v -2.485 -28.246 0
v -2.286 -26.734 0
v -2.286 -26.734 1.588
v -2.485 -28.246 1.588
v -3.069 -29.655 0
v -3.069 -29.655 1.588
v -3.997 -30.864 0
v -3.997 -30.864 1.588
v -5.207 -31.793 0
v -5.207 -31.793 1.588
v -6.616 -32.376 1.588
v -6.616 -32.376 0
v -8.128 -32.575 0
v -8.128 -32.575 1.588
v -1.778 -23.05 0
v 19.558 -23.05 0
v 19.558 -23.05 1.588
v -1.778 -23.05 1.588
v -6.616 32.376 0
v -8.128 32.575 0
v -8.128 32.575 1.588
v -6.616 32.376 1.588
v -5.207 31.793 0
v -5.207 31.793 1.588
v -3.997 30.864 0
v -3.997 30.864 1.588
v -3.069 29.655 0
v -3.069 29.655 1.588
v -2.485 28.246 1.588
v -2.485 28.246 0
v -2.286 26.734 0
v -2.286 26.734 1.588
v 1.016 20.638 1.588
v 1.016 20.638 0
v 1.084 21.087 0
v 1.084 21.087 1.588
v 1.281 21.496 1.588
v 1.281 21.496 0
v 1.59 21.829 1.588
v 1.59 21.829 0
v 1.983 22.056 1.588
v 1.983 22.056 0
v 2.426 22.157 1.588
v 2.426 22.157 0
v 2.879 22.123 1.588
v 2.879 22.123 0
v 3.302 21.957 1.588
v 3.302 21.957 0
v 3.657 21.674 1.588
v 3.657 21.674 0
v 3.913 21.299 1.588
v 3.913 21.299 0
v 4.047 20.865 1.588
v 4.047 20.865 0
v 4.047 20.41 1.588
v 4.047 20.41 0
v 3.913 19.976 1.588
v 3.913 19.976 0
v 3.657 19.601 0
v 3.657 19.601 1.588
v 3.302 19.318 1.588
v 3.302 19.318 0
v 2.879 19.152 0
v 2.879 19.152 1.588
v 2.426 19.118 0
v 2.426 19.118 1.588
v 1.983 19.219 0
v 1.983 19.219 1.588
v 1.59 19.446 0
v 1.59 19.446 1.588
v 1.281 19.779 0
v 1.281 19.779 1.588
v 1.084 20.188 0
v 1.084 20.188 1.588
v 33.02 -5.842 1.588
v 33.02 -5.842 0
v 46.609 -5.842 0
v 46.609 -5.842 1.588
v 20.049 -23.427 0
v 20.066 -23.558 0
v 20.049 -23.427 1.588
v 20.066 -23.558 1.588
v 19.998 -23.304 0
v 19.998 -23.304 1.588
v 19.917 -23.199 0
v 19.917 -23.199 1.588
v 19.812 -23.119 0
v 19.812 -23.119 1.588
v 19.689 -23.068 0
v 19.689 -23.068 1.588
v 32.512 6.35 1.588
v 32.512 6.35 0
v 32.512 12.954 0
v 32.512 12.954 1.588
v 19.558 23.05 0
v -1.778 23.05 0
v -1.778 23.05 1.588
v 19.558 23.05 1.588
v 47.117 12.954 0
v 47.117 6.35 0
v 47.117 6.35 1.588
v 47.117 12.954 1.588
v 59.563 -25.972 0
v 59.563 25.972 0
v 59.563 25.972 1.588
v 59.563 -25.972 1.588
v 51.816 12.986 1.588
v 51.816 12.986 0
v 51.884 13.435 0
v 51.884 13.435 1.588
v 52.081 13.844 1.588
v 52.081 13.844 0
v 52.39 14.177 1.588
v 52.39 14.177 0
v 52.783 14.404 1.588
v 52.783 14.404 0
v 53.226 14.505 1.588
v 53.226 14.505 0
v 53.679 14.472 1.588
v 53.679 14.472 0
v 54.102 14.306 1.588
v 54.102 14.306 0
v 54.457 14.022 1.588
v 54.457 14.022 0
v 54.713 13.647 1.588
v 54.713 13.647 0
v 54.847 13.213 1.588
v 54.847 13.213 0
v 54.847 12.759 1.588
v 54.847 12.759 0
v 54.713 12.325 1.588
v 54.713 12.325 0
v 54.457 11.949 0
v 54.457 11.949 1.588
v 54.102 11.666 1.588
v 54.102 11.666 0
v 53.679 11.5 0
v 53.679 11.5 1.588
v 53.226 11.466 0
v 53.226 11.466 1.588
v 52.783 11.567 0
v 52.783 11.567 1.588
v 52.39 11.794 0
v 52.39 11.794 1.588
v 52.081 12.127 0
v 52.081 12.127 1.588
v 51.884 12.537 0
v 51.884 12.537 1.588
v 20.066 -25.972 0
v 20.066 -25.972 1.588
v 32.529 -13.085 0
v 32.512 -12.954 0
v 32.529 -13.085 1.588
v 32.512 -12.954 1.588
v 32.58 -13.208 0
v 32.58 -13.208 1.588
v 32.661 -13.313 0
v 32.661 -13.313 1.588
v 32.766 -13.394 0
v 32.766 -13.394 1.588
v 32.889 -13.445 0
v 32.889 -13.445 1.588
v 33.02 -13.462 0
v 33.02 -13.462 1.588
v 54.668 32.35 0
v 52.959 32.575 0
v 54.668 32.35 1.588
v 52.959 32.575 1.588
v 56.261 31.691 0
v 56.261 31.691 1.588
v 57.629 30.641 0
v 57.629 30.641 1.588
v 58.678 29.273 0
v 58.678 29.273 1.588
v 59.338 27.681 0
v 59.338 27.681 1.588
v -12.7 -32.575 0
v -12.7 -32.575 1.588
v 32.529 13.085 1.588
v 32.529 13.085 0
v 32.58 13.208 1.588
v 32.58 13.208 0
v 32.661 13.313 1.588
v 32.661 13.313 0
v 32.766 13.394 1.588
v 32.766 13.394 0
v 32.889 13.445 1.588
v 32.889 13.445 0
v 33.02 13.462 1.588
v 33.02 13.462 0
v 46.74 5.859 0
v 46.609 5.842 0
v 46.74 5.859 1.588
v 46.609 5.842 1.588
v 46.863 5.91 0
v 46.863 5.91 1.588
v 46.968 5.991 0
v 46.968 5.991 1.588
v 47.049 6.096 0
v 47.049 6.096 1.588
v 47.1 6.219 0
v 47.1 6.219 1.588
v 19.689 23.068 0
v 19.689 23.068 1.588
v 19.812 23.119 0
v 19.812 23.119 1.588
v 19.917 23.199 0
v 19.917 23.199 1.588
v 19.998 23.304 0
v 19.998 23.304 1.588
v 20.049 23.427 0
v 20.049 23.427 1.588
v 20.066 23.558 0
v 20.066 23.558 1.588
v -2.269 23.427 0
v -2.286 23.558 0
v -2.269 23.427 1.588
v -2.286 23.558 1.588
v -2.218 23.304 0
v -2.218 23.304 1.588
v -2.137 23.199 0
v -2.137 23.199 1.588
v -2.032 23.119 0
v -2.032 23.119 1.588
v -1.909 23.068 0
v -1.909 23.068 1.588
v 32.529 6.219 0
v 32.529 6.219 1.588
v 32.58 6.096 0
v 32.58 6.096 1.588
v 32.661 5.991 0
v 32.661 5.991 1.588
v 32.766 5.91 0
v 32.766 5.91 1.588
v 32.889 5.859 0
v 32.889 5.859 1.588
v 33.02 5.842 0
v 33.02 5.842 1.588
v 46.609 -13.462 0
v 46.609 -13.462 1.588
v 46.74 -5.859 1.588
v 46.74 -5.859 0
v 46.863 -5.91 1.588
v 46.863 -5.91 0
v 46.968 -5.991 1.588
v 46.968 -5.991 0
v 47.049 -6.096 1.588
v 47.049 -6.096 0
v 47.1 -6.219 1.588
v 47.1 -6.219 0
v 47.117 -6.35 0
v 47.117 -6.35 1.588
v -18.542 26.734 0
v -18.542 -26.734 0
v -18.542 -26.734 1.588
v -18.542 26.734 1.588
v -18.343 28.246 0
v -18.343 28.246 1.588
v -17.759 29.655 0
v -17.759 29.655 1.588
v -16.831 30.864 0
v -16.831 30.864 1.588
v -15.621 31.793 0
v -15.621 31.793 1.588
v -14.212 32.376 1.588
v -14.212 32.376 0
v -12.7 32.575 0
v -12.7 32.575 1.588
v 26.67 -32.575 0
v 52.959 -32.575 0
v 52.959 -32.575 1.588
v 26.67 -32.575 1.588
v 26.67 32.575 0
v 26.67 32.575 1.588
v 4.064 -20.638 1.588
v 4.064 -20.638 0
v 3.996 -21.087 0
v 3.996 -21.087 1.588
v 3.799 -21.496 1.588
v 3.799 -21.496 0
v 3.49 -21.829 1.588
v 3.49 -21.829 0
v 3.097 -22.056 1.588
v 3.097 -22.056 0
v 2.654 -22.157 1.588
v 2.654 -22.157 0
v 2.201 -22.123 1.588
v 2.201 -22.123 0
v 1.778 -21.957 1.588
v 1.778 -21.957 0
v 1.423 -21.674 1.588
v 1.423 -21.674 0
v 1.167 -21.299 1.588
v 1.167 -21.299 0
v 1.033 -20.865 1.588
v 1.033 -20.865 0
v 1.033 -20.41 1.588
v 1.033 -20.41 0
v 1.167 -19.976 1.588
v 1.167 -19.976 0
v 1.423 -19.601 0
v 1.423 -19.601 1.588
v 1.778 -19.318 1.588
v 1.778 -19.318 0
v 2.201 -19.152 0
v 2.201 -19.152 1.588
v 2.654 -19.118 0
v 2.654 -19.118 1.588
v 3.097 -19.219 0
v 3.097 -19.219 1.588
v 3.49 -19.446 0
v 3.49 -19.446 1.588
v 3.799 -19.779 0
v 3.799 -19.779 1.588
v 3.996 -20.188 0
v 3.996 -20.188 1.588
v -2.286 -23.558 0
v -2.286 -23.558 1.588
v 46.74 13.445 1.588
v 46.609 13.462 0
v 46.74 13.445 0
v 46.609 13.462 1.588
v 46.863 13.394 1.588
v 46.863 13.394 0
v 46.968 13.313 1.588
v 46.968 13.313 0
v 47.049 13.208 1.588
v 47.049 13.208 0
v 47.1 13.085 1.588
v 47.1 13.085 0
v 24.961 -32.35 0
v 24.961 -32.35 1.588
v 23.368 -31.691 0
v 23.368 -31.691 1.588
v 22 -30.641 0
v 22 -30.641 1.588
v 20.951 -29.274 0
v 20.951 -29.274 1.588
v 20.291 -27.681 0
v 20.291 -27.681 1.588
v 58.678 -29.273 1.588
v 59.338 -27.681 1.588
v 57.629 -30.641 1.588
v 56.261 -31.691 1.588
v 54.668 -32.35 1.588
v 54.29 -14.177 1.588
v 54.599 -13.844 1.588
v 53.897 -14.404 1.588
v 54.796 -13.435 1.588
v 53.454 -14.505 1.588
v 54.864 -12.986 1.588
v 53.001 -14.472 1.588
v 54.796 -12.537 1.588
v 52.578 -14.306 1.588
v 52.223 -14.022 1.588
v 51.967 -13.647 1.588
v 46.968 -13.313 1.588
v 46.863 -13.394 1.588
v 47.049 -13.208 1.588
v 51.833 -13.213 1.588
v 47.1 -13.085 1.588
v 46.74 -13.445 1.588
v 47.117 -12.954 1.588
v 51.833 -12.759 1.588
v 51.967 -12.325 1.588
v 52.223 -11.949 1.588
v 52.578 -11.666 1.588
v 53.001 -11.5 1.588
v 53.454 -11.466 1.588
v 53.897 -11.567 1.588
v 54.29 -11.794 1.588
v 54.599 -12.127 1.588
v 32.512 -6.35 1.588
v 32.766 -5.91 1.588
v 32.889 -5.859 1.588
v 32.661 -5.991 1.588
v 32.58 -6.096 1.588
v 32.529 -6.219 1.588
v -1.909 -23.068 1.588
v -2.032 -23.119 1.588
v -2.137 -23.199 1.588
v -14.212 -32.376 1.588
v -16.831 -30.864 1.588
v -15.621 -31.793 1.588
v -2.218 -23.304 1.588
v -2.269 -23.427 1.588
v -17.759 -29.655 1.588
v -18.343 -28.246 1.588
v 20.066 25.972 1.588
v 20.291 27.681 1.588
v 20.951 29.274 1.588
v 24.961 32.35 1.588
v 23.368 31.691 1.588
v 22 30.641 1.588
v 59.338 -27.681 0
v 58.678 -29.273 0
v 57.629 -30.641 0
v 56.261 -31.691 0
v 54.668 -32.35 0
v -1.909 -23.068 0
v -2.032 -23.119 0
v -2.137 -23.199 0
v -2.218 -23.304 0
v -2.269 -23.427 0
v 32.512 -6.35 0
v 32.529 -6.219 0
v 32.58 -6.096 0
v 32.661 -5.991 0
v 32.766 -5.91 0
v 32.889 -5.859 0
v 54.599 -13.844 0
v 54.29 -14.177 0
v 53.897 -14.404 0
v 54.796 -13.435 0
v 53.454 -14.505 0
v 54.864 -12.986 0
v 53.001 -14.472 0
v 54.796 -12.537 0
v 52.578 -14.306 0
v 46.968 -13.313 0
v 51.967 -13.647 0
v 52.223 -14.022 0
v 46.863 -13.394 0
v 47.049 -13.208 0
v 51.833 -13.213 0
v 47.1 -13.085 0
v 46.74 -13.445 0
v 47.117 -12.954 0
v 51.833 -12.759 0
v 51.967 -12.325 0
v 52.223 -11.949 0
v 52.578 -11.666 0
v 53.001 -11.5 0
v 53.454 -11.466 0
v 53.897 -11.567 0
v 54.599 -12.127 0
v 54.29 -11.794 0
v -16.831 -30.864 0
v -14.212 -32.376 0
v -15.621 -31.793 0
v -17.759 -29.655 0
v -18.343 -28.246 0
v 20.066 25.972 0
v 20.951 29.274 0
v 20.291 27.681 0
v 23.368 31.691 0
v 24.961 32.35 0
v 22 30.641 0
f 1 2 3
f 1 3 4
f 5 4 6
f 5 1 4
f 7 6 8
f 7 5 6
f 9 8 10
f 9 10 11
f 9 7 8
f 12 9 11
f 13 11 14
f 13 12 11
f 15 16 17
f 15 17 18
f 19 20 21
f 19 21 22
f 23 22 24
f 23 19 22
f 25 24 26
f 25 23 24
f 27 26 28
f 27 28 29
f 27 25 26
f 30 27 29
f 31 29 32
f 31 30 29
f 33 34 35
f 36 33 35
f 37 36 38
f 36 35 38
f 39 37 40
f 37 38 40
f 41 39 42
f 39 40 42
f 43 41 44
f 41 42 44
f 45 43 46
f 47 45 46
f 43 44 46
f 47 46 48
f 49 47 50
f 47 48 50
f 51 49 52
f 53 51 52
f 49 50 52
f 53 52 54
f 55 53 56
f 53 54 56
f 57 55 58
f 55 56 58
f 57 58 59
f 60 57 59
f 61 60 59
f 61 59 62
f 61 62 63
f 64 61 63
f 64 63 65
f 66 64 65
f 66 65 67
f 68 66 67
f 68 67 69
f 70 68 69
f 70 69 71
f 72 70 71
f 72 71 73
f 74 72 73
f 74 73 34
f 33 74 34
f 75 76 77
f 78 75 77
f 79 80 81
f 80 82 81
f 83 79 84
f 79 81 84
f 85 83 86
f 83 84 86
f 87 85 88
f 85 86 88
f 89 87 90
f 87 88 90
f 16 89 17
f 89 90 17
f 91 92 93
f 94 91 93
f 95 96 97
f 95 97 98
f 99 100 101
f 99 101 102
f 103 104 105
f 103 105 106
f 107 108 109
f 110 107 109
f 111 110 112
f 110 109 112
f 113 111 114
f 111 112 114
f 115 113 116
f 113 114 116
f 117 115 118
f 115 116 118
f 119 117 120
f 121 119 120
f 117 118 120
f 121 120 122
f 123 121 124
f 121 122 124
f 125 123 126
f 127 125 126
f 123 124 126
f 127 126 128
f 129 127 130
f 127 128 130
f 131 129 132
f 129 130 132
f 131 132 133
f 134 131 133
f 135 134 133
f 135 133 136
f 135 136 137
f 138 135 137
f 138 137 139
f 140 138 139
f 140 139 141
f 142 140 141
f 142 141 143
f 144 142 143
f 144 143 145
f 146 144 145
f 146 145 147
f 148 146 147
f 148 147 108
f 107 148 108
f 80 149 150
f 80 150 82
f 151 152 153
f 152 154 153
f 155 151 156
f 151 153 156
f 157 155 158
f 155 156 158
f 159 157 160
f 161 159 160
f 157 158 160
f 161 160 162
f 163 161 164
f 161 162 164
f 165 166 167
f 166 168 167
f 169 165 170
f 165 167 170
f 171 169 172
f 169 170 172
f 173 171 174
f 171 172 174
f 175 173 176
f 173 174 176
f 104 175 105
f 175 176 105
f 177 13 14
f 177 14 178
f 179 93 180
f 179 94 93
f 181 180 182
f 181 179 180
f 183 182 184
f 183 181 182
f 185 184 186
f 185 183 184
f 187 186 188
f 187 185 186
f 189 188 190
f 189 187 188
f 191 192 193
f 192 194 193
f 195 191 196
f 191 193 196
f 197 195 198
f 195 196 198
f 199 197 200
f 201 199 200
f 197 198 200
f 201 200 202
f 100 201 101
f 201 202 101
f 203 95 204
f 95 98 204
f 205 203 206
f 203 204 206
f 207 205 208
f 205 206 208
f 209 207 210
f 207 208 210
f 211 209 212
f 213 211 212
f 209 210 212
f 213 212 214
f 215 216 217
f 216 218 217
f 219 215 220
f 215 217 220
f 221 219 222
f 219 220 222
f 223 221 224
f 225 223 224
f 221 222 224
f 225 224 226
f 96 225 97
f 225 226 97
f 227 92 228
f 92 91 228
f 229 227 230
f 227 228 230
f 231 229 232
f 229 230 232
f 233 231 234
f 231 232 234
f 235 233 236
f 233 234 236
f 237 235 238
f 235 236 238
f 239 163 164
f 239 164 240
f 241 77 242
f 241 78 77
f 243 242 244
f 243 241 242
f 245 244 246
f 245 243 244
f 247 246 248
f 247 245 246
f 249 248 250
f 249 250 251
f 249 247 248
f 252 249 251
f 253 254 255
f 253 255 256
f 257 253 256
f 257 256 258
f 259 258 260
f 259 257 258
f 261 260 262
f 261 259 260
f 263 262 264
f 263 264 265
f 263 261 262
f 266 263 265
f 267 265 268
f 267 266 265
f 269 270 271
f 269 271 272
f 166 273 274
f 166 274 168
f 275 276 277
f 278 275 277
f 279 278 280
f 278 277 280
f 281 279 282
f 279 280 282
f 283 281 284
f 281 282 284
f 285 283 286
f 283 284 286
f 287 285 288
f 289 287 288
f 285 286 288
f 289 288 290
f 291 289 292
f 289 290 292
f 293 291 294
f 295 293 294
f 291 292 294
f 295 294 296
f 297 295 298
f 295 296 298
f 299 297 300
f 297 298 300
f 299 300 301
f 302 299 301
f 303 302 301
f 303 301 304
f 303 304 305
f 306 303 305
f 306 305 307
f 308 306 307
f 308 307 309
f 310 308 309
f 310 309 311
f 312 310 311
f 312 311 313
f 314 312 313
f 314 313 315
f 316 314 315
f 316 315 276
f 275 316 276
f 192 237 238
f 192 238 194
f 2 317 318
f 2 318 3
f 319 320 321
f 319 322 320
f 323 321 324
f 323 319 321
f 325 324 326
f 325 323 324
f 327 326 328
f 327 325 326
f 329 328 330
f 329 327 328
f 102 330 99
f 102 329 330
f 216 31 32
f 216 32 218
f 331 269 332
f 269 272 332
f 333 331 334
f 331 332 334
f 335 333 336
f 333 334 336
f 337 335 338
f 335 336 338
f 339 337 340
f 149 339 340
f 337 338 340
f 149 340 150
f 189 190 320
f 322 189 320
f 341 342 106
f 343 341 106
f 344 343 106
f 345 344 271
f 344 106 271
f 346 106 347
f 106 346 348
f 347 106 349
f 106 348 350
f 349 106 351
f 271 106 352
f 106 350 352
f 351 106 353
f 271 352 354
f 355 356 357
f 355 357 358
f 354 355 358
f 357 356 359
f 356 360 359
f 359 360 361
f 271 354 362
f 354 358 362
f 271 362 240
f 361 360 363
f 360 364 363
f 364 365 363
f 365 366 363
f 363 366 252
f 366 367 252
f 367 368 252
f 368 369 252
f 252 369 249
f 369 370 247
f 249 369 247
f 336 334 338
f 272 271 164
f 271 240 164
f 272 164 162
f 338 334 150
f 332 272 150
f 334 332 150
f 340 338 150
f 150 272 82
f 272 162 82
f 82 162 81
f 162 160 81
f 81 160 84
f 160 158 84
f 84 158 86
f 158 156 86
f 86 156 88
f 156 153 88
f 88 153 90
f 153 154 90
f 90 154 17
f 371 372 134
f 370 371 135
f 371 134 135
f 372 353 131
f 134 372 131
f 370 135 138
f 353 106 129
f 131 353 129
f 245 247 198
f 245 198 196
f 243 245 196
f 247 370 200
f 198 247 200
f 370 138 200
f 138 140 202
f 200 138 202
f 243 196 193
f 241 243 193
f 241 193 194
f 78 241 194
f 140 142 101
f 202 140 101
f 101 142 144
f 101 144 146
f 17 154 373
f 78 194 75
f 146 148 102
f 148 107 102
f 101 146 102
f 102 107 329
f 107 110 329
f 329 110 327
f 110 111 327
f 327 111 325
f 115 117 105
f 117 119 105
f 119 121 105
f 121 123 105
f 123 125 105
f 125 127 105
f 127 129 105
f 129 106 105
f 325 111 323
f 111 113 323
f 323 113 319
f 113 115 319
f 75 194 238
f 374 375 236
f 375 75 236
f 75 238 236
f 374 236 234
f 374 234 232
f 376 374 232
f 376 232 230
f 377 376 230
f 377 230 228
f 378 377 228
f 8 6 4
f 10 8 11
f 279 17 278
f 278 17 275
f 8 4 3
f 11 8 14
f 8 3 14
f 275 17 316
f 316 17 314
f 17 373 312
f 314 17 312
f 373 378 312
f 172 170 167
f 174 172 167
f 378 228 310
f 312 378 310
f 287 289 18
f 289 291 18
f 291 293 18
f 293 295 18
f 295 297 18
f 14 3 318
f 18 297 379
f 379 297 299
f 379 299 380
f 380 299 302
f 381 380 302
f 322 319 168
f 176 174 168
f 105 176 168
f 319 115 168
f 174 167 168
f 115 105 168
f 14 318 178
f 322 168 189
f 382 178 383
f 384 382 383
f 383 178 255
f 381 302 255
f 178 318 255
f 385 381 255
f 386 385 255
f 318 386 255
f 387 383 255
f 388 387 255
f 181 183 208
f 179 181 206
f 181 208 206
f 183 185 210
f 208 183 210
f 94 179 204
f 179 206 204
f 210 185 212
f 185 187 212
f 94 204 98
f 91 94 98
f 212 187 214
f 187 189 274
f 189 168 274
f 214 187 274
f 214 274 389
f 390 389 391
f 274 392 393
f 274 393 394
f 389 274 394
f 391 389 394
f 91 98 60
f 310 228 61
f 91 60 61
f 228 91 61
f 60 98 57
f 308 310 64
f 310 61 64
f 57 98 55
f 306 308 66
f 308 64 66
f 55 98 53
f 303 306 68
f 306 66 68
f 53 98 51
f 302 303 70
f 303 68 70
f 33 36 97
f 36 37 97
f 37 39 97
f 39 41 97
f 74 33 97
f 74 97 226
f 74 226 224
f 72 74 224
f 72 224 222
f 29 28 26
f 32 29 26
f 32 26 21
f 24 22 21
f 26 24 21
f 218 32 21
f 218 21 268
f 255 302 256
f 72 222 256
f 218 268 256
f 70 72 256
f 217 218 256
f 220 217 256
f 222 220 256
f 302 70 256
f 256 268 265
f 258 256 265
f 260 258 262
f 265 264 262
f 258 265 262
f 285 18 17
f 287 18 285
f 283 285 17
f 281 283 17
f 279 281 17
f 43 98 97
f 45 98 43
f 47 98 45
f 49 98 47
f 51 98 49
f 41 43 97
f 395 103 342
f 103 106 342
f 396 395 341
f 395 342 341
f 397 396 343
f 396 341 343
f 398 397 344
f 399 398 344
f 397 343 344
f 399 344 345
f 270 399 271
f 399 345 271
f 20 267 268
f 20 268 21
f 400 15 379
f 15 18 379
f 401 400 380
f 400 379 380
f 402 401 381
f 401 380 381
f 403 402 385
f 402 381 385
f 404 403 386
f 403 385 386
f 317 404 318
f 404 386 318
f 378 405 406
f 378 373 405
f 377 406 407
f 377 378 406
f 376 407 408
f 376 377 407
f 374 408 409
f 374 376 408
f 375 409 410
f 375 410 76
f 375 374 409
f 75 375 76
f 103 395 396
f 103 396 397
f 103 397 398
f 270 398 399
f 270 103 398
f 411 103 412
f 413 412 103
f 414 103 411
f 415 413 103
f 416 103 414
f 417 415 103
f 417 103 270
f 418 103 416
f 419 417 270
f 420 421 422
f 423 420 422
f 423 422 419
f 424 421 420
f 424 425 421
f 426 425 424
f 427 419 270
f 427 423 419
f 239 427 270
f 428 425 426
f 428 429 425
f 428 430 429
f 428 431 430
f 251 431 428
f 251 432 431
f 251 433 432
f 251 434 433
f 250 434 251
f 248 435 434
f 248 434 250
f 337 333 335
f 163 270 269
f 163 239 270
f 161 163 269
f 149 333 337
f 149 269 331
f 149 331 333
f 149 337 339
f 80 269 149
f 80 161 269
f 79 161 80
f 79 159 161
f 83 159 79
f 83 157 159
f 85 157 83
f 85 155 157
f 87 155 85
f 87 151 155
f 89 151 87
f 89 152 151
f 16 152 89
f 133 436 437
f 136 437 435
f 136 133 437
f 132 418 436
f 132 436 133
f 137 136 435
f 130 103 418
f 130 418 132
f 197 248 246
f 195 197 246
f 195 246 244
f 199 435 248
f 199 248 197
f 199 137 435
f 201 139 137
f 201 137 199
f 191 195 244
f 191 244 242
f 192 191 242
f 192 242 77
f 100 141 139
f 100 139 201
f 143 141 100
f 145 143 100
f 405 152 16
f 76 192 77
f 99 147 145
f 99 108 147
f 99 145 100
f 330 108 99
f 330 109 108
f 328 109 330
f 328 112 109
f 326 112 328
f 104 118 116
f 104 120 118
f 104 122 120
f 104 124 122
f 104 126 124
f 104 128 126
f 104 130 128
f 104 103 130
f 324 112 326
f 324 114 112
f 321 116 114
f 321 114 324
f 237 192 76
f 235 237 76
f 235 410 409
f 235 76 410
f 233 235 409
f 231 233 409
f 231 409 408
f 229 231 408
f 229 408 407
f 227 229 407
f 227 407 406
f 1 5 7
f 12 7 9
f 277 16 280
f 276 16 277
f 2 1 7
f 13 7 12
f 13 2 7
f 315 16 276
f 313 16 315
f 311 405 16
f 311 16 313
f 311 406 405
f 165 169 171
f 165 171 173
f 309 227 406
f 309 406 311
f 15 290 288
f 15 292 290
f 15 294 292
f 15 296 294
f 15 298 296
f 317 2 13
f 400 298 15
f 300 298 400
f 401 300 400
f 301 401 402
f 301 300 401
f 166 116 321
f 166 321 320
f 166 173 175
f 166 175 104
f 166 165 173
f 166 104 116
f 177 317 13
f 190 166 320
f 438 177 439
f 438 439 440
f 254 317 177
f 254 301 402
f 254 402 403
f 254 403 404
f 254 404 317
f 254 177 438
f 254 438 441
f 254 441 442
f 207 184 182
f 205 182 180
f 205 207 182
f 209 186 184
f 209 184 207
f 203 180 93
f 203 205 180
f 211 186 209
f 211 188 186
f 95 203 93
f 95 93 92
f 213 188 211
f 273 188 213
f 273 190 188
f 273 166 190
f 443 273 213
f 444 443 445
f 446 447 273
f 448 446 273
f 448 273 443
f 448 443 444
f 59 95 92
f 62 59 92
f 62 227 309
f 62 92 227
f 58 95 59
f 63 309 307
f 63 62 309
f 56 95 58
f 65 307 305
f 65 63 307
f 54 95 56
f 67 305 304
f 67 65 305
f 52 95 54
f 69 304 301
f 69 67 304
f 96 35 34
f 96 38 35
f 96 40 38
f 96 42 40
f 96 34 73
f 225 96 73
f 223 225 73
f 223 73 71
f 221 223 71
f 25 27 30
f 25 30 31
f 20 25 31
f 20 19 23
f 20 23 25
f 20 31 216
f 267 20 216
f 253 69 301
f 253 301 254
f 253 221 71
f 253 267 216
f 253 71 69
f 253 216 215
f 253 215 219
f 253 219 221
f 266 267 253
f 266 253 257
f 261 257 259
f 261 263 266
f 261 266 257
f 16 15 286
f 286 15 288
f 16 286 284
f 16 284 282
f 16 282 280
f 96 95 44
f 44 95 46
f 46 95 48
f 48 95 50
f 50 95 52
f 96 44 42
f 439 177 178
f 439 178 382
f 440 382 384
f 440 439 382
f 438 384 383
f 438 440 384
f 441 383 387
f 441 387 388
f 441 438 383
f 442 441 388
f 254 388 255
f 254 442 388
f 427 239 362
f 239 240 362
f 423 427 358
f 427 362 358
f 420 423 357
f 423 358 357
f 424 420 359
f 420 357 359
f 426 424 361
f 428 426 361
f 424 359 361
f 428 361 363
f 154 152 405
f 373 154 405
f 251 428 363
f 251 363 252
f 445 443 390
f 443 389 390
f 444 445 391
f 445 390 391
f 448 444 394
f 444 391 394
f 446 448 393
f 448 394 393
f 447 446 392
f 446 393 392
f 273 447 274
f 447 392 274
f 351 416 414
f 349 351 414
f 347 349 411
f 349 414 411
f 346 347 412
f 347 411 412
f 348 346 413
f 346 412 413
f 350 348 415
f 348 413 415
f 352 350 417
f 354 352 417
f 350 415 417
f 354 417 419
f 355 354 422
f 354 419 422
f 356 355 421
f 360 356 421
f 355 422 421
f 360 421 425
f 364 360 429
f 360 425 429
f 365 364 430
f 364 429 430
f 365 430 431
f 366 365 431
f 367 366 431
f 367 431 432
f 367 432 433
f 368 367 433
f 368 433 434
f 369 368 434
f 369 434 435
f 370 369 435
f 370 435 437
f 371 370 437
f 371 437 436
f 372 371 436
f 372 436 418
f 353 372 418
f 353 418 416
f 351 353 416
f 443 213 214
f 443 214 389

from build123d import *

# Parameters (mm, degrees)
SKETCH2_W           = 14.605
SKETCH2_H           = 7.62
BOSS_EXTRUDE1_DEPTH = 1.5875
SKETCH3_R           = 1.524
CUT_EXTRUDE1_DEPTH  = 68.907542479
FILLET1_R           = 0.508
FILLET2_R           = 6.604


with BuildPart() as part:
    # Sketch2 → Boss-Extrude1 (new body)
    with BuildSketch(Plane.XY):
        with BuildLine():
            Line((-2.286, 26.7335), (-2.286, 23.0505))
            Line((-2.286, 23.0505), (18.796, 23.0505))
            Line((18.796, 23.0505), (20.066, 23.0505))
            Line((20.066, 23.0505), (20.066, 32.5755))
            Line((20.066, 32.5755), (59.563, 32.5755))
            Line((59.563, 32.5755), (59.563, 13.462))
            Line((59.563, 13.462), (59.563, -13.462))
            Line((59.563, -13.462), (59.563, -32.5755))
            Line((59.563, -32.5755), (20.066, -32.5755))
            Line((20.066, -32.5755), (20.066, -23.0505))
            Line((20.066, -23.0505), (18.796, -23.0505))
            Line((18.796, -23.0505), (-2.286, -23.0505))
            Line((-2.286, -23.0505), (-2.286, -26.7335))
            ThreePointArc((-2.286, -26.7335), (-3.997082184, -30.864417816), (-8.128, -32.5755))
            Line((-8.128, -32.5755), (-12.7, -32.5755))
            ThreePointArc((-12.7, -32.5755), (-16.830917816, -30.864417816), (-18.542, -26.7335))
            Line((-18.542, -26.7335), (-18.542, 26.7335))
            ThreePointArc((-18.542, 26.7335), (-16.830917816, 30.864417816), (-12.7, 32.5755))
            Line((-12.7, 32.5755), (-8.128, 32.5755))
            ThreePointArc((-8.128, 32.5755), (-3.997082184, 30.864417816), (-2.286, 26.7335))
        make_face()
        with Locations((39.8145, -9.652)):
            Rectangle(SKETCH2_W, SKETCH2_H, mode=Mode.SUBTRACT)
        with Locations((39.8145, 9.652)):
            Rectangle(SKETCH2_W, SKETCH2_H, mode=Mode.SUBTRACT)
    extrude(amount=BOSS_EXTRUDE1_DEPTH)

    # Sketch3 → Cut-Extrude1 (cut, through all)
    with BuildSketch(Plane(origin=(0, 0, 0), x_dir=(-1, 0, 0), z_dir=(0, 0, -1))):
        with Locations((-53.34, 12.98575)):
            Circle(SKETCH3_R)
        with Locations(Location((-53.34, -12.98575, 0), (0, 0, 180))):
            Circle(SKETCH3_R)
        with Locations((-2.54, 20.6375)):
            Circle(SKETCH3_R)
        with Locations(Location((-2.54, -20.6375, 0), (0, 0, 180))):
            Circle(SKETCH3_R)
    extrude(amount=-CUT_EXTRUDE1_DEPTH, mode=Mode.SUBTRACT)

    # Fillet1
    fillet1_edges = [part.edges().sort_by_distance(p)[0] for p in [
        (-2.286, -23.0505, 0.79375),
        (-2.286, 23.0505, 0.79375),
        (20.066, 23.0505, 0.79375),
        (20.066, -23.0505, 0.79375),
        (32.512, 13.462, 0.79375),
        (32.512, 5.842, 0.79375),
        (47.117, 5.842, 0.79375),
        (47.117, 13.462, 0.79375),
        (47.117, -5.842, 0.79375),
        (32.512, -5.842, 0.79375),
        (32.512, -13.462, 0.79375),
        (47.117, -13.462, 0.79375),
    ]]
    fillet(fillet1_edges, radius=FILLET1_R)

    # Fillet2
    fillet2_edges = [part.edges().sort_by_distance(p)[0] for p in [
        (20.066, 32.5755, 0.79375),
        (59.563, 32.5755, 0.79375),
        (59.563, -32.5755, 0.79375),
        (20.066, -32.5755, 0.79375),
    ]]
    fillet(fillet2_edges, radius=FILLET2_R)


solid = part.part
